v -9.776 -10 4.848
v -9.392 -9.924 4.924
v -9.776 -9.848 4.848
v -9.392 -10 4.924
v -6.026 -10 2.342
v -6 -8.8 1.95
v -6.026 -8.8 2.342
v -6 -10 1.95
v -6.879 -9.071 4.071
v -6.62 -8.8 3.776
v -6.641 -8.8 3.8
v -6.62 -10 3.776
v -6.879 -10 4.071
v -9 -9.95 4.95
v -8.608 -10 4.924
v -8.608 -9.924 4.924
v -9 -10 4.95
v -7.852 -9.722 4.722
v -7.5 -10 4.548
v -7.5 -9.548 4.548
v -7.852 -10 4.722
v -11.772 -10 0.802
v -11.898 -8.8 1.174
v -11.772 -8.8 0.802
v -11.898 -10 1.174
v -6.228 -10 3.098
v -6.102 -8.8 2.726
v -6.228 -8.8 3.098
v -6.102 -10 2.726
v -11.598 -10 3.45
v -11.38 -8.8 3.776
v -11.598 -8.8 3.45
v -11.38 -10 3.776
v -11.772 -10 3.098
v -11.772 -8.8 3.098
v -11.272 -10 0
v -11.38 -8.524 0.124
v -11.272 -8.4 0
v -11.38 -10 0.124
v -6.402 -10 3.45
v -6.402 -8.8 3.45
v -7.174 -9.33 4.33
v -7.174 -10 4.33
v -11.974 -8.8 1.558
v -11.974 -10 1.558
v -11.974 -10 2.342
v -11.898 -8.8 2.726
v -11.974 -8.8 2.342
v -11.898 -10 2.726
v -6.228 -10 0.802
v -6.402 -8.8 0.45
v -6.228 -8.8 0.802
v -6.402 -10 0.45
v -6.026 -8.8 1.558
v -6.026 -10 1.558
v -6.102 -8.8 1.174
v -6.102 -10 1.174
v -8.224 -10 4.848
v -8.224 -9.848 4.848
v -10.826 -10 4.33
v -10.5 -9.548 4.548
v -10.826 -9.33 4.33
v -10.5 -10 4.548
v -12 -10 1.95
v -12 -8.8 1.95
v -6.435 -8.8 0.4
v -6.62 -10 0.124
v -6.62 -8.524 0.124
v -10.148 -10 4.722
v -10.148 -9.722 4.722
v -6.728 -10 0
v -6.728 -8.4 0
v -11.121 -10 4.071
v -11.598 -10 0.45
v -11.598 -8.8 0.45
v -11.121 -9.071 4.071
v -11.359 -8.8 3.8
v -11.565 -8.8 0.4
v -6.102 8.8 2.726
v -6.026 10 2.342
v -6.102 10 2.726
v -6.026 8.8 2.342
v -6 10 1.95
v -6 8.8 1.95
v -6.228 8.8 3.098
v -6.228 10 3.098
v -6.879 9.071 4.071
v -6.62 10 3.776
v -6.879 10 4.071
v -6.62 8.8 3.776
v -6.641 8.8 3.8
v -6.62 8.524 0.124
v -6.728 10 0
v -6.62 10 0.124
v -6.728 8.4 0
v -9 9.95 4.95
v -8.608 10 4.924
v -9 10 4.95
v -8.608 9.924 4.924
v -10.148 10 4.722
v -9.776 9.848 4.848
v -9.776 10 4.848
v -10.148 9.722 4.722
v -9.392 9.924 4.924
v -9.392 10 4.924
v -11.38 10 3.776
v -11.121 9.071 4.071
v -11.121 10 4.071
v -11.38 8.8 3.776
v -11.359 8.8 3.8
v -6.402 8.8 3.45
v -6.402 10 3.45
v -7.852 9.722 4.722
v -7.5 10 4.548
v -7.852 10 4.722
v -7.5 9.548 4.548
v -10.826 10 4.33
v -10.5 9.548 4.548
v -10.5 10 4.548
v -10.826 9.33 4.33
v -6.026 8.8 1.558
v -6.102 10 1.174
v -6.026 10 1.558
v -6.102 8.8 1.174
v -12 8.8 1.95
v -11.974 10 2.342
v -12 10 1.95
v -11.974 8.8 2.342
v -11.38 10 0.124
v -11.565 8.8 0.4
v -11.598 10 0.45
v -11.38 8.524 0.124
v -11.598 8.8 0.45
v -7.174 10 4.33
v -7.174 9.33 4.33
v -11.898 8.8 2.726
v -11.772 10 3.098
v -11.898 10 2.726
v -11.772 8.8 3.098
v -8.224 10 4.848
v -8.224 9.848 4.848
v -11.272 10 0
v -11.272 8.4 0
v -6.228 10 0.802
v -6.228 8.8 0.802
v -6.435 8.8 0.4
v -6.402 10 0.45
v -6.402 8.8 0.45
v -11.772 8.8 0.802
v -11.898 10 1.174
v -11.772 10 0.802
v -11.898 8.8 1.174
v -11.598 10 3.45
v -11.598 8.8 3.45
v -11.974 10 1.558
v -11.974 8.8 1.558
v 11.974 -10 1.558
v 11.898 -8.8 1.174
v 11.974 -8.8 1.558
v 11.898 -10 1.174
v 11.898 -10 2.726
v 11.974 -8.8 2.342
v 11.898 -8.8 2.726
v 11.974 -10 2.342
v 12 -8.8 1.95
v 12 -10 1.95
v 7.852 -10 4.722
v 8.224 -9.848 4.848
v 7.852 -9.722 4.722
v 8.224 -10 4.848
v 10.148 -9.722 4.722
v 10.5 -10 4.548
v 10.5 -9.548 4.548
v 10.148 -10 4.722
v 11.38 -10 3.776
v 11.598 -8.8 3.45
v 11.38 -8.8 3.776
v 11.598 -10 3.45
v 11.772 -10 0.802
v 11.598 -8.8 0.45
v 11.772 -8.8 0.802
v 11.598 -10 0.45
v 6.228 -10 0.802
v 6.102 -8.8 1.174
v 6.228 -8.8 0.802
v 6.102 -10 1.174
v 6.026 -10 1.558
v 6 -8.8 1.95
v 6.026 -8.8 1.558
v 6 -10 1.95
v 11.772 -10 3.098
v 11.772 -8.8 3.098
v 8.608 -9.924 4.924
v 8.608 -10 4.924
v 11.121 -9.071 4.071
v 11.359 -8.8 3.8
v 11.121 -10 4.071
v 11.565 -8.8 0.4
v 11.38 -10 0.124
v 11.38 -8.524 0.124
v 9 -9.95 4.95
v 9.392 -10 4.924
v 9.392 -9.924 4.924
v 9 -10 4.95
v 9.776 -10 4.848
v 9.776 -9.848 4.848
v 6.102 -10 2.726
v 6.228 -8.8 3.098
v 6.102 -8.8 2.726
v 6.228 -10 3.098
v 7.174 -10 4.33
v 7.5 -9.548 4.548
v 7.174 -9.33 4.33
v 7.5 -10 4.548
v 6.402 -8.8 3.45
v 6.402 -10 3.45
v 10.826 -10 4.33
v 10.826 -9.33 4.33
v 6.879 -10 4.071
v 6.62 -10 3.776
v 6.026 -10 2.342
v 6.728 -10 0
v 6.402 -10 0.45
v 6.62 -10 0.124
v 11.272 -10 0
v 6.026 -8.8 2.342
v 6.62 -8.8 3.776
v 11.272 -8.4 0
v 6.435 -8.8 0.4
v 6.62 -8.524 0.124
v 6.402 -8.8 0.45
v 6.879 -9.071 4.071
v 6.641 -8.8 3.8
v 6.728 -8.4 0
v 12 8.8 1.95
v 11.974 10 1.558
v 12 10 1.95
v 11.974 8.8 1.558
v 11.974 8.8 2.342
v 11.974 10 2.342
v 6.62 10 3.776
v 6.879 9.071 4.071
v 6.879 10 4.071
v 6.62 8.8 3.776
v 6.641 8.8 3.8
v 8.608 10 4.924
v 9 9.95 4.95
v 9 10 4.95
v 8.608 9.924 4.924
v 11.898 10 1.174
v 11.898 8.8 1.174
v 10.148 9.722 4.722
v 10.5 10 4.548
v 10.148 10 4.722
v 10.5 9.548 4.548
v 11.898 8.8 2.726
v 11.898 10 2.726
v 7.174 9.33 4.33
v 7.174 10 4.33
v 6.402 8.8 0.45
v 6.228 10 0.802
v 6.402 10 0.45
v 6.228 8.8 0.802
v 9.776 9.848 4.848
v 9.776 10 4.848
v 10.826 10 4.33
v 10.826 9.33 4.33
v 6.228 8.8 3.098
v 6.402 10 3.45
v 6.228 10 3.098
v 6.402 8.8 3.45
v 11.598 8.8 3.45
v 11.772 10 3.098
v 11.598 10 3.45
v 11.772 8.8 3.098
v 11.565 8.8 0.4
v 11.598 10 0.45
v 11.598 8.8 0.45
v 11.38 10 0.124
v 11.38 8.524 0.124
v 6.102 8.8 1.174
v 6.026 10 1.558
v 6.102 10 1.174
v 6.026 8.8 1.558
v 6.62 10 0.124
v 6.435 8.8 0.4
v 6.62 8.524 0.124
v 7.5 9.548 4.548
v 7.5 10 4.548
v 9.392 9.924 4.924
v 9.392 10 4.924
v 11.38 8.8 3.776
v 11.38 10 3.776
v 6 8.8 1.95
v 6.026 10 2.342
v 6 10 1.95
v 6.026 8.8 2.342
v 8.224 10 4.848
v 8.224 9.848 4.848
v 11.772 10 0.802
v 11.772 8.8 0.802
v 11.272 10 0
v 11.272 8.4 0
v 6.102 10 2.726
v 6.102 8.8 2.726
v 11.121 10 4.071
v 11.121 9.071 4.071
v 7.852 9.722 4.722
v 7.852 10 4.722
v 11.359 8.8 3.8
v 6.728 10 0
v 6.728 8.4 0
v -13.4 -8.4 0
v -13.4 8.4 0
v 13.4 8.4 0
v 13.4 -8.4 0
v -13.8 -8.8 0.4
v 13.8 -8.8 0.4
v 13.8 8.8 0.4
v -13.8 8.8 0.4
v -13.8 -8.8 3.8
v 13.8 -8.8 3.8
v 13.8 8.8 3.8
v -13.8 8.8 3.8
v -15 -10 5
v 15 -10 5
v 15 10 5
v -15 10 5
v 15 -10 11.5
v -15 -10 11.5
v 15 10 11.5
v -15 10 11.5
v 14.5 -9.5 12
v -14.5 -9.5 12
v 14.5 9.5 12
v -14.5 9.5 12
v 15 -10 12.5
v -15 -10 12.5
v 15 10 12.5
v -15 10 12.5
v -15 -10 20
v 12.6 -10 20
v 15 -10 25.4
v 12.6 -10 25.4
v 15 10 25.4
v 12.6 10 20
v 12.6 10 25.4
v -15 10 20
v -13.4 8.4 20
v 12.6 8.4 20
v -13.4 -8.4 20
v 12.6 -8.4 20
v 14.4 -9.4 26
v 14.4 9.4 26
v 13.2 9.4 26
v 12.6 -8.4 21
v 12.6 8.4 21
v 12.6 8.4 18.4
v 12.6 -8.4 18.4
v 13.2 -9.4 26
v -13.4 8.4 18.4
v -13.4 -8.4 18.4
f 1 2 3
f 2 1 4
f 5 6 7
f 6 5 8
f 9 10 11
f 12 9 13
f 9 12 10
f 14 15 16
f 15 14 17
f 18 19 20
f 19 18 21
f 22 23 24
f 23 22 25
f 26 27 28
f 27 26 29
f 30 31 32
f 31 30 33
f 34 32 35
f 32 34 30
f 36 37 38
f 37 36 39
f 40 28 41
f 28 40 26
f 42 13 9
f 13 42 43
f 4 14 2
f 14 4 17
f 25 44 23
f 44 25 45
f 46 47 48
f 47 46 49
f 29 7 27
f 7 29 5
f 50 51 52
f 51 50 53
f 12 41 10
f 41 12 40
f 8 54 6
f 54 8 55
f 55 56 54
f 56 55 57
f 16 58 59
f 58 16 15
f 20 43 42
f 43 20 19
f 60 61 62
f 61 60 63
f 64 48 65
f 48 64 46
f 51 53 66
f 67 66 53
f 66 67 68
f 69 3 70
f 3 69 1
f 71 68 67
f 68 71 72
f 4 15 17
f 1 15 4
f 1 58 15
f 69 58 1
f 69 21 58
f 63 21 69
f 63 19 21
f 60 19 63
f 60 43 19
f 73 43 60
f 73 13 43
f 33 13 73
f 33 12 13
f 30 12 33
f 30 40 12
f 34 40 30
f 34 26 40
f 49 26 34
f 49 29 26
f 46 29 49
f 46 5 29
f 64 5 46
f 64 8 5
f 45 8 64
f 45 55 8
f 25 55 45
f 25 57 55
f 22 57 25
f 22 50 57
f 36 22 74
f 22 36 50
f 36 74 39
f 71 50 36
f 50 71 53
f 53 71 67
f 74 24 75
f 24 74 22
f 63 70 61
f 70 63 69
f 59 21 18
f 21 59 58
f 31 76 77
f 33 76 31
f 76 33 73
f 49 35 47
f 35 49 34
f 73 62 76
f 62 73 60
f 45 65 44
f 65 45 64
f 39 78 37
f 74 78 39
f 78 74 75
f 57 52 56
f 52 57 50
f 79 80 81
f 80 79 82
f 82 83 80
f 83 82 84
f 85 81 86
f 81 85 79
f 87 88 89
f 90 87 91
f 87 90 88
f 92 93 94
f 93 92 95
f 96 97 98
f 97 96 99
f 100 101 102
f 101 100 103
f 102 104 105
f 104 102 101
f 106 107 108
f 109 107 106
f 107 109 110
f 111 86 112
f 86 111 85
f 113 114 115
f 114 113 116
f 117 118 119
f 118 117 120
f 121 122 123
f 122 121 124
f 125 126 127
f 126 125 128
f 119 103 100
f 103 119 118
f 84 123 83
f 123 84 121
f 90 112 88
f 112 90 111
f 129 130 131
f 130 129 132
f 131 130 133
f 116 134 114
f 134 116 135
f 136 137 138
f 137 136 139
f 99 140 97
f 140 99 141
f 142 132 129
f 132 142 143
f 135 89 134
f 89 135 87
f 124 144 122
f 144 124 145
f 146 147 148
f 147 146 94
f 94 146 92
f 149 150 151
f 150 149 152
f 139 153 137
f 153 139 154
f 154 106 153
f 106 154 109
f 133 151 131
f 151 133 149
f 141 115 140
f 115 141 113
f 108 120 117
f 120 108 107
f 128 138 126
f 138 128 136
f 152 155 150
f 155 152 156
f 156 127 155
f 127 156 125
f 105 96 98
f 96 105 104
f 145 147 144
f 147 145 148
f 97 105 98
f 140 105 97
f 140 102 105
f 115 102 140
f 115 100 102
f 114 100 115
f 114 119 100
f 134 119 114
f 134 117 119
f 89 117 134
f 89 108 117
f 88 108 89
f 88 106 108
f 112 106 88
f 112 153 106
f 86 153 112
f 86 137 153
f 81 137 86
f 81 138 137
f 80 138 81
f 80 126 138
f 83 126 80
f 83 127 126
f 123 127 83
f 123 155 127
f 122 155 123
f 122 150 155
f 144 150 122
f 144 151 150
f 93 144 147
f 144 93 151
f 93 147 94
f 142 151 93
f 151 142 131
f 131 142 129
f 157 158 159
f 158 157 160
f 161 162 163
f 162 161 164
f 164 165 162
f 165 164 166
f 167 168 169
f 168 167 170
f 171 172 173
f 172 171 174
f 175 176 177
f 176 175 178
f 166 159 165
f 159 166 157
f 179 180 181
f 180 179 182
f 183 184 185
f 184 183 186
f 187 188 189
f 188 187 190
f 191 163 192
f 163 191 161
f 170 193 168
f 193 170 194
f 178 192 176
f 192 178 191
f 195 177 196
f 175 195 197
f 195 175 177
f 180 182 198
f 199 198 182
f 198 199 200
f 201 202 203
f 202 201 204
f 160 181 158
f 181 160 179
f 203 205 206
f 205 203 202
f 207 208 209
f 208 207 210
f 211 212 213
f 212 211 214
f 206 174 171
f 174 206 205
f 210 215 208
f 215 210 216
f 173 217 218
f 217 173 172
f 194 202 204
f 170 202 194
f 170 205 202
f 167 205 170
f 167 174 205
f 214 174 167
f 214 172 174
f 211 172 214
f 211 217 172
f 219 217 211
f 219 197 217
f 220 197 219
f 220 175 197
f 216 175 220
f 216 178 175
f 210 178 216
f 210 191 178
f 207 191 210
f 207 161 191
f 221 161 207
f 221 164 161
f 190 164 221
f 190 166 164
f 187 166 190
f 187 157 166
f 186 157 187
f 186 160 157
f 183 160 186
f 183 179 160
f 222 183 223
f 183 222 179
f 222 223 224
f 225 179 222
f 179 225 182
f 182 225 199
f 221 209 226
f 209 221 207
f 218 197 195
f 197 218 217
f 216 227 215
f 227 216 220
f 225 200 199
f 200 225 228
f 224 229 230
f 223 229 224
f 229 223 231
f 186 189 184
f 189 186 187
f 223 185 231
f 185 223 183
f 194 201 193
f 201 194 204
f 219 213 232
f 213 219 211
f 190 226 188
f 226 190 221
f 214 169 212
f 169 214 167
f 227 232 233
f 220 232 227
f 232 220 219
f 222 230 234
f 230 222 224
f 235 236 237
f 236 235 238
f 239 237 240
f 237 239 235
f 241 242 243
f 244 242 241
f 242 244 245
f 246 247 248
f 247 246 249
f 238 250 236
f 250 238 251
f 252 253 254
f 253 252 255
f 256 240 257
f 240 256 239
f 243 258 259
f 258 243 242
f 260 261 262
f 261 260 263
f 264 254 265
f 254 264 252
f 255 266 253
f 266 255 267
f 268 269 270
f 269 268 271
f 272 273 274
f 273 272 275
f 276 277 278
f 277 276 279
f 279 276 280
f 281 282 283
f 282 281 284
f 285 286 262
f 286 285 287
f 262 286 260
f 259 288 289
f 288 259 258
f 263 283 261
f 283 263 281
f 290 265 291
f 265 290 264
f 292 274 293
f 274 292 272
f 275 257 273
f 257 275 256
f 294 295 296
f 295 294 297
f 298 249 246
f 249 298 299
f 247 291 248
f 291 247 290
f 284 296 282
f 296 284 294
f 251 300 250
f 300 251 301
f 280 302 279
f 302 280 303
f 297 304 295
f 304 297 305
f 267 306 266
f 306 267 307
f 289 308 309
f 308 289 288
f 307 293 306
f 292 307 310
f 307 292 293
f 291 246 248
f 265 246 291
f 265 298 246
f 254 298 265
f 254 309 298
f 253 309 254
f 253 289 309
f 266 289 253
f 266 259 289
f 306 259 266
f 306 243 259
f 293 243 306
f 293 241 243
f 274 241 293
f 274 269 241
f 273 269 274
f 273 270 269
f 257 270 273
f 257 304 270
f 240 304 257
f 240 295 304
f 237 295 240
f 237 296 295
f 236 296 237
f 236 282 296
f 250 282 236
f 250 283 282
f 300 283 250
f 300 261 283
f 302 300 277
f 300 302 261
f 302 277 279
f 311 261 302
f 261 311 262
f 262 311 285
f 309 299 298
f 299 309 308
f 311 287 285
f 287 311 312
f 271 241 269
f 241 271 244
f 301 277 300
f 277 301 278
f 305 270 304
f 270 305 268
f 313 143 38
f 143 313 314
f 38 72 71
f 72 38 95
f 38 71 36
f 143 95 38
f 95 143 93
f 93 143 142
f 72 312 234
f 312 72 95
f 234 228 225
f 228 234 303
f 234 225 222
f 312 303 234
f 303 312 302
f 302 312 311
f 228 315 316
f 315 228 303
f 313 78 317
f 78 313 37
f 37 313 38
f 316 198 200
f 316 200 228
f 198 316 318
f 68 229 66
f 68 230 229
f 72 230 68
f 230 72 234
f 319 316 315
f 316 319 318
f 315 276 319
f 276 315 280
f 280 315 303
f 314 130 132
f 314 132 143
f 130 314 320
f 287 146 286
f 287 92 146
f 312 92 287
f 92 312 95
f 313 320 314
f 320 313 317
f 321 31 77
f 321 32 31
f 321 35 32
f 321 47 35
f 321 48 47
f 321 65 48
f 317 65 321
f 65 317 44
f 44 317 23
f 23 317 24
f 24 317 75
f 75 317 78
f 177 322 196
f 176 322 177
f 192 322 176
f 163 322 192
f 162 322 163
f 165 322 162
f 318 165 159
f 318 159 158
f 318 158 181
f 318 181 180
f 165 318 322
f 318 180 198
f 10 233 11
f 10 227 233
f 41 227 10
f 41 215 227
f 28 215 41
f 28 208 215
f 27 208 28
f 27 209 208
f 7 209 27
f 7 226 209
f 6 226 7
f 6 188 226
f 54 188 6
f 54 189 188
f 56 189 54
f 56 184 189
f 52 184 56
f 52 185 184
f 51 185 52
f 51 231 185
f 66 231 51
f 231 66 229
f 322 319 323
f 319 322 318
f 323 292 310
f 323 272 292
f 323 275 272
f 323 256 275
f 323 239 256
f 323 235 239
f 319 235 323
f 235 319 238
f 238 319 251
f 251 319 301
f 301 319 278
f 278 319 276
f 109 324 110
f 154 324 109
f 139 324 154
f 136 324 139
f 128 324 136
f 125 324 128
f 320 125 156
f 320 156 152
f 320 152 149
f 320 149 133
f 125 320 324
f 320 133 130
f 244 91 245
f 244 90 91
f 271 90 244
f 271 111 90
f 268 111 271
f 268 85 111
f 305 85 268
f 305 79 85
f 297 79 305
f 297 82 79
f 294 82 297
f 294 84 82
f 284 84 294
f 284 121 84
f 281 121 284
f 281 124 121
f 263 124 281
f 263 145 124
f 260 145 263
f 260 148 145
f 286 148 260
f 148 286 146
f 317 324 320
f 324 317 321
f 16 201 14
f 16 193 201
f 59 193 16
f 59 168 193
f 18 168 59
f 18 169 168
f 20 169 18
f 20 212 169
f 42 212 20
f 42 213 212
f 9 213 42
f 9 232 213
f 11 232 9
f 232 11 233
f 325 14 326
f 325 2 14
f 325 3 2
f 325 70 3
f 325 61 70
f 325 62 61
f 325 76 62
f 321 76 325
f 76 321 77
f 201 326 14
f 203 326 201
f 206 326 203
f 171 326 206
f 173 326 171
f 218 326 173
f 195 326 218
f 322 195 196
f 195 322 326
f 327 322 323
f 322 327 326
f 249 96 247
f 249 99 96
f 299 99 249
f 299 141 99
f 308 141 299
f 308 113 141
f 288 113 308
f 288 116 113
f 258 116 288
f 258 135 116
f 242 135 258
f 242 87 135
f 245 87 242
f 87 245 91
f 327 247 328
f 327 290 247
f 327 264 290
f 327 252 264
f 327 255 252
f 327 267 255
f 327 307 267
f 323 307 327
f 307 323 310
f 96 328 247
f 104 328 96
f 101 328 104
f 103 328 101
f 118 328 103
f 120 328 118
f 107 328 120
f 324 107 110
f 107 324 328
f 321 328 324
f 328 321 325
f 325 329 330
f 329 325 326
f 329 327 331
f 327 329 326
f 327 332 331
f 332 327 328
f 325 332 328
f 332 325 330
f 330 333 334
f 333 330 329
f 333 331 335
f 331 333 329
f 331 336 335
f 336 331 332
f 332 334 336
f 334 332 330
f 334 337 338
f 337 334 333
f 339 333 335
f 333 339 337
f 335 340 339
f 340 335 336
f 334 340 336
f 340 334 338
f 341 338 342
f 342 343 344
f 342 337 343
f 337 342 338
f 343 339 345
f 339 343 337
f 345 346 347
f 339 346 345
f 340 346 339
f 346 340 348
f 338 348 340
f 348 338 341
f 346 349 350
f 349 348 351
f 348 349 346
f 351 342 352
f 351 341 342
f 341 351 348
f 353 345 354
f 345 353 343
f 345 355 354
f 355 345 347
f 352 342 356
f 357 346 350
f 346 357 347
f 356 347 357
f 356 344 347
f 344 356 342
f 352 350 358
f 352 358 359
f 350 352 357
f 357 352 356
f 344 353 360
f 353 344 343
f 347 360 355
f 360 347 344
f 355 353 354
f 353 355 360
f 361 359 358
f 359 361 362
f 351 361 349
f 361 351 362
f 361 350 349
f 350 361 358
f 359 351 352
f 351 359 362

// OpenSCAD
// trolley.scad - procedure trolley (design_brief.md 4.5), version = "small" (30 x 20, 26 high)
// or "large" (52 x 34, 30 high). Solid body with a 1.6 deep tray, rim 1.6 (2.4 at the handle
// end), 2.4 push handle rising 6 at +x, bottom 5 mm set in 1.2 with a 45 deg step, four
// embossed wheels on the long sides touching the table, optional drawer lines as V-grooves.
// Single colour, prints upright.   Export: openscad -o trolley_small.stl -D 'version="small"' trolley.scad
//                                          openscad -o trolley_large.stl -D 'version="large"' trolley.scad
include <common.scad>

version      = "small";
handle       = true;
handle_h     = 6;
handle_t     = min_handled;    // 2.4
rim          = min_wall;       // 1.6
rim_handle   = min_handled;    // 2.4 at the handle end
tray_depth   = 1.6;
base_h       = 5;              // set-in bottom
base_in      = 1.2;
drawer_lines = true;
groove_w     = 1;              // drawer line opening; 0.5 deep, 45 deg flanks
wheel_sink   = 0.35;           // wheel sunk into the table by this share of its radius: flat
                               // bottom on the bed, no overhang beyond 42 deg

function trolley_size(v)  = v == "large" ? [52, 34, 24] : [30, 20, 20];   // length, width, body height
function wheel_dia(v)     = v == "large" ? 8 : 6;
function drawer_z(v)      = v == "large" ? [11, 17] : [12];

module trolley(v = version) {
    sz = trolley_size(v); l = sz[0] / 2; w = sz[1] / 2; body_h = sz[2];
    cb = chamfer_bottom; g = groove_w / 2; wd = wheel_dia(v); r = wd / 2;
    band_colour(1) difference() {
        intersection() {
            union() {
                ring_stack(concat([[l - base_in - cb, w - base_in - cb, 0], [l - base_in, w - base_in, cb],
                                   [l - base_in, w - base_in, base_h - base_in], [l, w, base_h]],
                                  drawer_lines ? [for (z = drawer_z(v)) each [[l, w, z - g], [l - g, w - g, z], [l, w, z + g]]] : [],
                                  [[l, w, body_h]]));
                for (x = [-(l - wd), l - wd], s = [-1, 1])
                    translate([x, s * (w - (base_in + 1) / 2), r - wheel_sink * r])
                        rotate([90, 0, 0]) cylinder(d = wd, h = base_in + 1, center = true, $fn = 48);
                if (handle) translate([l - handle_t / 2, 0, body_h - 0.5])
                    chamfered_box([handle_t, sz[1], handle_h + 0.5], cb = 0, ct = 0.6);
            }
            translate([-l - 1, -w - 1, 0]) cube([sz[0] + 2, sz[1] + 2, body_h + handle_h + 1]);   // clips the wheels at the table
        }
        translate([-l + rim, -(w - rim), body_h - tray_depth]) cube([sz[0] - rim - rim_handle, sz[1] - 2 * rim, tray_depth + 1]);
    }
}

trolley();
